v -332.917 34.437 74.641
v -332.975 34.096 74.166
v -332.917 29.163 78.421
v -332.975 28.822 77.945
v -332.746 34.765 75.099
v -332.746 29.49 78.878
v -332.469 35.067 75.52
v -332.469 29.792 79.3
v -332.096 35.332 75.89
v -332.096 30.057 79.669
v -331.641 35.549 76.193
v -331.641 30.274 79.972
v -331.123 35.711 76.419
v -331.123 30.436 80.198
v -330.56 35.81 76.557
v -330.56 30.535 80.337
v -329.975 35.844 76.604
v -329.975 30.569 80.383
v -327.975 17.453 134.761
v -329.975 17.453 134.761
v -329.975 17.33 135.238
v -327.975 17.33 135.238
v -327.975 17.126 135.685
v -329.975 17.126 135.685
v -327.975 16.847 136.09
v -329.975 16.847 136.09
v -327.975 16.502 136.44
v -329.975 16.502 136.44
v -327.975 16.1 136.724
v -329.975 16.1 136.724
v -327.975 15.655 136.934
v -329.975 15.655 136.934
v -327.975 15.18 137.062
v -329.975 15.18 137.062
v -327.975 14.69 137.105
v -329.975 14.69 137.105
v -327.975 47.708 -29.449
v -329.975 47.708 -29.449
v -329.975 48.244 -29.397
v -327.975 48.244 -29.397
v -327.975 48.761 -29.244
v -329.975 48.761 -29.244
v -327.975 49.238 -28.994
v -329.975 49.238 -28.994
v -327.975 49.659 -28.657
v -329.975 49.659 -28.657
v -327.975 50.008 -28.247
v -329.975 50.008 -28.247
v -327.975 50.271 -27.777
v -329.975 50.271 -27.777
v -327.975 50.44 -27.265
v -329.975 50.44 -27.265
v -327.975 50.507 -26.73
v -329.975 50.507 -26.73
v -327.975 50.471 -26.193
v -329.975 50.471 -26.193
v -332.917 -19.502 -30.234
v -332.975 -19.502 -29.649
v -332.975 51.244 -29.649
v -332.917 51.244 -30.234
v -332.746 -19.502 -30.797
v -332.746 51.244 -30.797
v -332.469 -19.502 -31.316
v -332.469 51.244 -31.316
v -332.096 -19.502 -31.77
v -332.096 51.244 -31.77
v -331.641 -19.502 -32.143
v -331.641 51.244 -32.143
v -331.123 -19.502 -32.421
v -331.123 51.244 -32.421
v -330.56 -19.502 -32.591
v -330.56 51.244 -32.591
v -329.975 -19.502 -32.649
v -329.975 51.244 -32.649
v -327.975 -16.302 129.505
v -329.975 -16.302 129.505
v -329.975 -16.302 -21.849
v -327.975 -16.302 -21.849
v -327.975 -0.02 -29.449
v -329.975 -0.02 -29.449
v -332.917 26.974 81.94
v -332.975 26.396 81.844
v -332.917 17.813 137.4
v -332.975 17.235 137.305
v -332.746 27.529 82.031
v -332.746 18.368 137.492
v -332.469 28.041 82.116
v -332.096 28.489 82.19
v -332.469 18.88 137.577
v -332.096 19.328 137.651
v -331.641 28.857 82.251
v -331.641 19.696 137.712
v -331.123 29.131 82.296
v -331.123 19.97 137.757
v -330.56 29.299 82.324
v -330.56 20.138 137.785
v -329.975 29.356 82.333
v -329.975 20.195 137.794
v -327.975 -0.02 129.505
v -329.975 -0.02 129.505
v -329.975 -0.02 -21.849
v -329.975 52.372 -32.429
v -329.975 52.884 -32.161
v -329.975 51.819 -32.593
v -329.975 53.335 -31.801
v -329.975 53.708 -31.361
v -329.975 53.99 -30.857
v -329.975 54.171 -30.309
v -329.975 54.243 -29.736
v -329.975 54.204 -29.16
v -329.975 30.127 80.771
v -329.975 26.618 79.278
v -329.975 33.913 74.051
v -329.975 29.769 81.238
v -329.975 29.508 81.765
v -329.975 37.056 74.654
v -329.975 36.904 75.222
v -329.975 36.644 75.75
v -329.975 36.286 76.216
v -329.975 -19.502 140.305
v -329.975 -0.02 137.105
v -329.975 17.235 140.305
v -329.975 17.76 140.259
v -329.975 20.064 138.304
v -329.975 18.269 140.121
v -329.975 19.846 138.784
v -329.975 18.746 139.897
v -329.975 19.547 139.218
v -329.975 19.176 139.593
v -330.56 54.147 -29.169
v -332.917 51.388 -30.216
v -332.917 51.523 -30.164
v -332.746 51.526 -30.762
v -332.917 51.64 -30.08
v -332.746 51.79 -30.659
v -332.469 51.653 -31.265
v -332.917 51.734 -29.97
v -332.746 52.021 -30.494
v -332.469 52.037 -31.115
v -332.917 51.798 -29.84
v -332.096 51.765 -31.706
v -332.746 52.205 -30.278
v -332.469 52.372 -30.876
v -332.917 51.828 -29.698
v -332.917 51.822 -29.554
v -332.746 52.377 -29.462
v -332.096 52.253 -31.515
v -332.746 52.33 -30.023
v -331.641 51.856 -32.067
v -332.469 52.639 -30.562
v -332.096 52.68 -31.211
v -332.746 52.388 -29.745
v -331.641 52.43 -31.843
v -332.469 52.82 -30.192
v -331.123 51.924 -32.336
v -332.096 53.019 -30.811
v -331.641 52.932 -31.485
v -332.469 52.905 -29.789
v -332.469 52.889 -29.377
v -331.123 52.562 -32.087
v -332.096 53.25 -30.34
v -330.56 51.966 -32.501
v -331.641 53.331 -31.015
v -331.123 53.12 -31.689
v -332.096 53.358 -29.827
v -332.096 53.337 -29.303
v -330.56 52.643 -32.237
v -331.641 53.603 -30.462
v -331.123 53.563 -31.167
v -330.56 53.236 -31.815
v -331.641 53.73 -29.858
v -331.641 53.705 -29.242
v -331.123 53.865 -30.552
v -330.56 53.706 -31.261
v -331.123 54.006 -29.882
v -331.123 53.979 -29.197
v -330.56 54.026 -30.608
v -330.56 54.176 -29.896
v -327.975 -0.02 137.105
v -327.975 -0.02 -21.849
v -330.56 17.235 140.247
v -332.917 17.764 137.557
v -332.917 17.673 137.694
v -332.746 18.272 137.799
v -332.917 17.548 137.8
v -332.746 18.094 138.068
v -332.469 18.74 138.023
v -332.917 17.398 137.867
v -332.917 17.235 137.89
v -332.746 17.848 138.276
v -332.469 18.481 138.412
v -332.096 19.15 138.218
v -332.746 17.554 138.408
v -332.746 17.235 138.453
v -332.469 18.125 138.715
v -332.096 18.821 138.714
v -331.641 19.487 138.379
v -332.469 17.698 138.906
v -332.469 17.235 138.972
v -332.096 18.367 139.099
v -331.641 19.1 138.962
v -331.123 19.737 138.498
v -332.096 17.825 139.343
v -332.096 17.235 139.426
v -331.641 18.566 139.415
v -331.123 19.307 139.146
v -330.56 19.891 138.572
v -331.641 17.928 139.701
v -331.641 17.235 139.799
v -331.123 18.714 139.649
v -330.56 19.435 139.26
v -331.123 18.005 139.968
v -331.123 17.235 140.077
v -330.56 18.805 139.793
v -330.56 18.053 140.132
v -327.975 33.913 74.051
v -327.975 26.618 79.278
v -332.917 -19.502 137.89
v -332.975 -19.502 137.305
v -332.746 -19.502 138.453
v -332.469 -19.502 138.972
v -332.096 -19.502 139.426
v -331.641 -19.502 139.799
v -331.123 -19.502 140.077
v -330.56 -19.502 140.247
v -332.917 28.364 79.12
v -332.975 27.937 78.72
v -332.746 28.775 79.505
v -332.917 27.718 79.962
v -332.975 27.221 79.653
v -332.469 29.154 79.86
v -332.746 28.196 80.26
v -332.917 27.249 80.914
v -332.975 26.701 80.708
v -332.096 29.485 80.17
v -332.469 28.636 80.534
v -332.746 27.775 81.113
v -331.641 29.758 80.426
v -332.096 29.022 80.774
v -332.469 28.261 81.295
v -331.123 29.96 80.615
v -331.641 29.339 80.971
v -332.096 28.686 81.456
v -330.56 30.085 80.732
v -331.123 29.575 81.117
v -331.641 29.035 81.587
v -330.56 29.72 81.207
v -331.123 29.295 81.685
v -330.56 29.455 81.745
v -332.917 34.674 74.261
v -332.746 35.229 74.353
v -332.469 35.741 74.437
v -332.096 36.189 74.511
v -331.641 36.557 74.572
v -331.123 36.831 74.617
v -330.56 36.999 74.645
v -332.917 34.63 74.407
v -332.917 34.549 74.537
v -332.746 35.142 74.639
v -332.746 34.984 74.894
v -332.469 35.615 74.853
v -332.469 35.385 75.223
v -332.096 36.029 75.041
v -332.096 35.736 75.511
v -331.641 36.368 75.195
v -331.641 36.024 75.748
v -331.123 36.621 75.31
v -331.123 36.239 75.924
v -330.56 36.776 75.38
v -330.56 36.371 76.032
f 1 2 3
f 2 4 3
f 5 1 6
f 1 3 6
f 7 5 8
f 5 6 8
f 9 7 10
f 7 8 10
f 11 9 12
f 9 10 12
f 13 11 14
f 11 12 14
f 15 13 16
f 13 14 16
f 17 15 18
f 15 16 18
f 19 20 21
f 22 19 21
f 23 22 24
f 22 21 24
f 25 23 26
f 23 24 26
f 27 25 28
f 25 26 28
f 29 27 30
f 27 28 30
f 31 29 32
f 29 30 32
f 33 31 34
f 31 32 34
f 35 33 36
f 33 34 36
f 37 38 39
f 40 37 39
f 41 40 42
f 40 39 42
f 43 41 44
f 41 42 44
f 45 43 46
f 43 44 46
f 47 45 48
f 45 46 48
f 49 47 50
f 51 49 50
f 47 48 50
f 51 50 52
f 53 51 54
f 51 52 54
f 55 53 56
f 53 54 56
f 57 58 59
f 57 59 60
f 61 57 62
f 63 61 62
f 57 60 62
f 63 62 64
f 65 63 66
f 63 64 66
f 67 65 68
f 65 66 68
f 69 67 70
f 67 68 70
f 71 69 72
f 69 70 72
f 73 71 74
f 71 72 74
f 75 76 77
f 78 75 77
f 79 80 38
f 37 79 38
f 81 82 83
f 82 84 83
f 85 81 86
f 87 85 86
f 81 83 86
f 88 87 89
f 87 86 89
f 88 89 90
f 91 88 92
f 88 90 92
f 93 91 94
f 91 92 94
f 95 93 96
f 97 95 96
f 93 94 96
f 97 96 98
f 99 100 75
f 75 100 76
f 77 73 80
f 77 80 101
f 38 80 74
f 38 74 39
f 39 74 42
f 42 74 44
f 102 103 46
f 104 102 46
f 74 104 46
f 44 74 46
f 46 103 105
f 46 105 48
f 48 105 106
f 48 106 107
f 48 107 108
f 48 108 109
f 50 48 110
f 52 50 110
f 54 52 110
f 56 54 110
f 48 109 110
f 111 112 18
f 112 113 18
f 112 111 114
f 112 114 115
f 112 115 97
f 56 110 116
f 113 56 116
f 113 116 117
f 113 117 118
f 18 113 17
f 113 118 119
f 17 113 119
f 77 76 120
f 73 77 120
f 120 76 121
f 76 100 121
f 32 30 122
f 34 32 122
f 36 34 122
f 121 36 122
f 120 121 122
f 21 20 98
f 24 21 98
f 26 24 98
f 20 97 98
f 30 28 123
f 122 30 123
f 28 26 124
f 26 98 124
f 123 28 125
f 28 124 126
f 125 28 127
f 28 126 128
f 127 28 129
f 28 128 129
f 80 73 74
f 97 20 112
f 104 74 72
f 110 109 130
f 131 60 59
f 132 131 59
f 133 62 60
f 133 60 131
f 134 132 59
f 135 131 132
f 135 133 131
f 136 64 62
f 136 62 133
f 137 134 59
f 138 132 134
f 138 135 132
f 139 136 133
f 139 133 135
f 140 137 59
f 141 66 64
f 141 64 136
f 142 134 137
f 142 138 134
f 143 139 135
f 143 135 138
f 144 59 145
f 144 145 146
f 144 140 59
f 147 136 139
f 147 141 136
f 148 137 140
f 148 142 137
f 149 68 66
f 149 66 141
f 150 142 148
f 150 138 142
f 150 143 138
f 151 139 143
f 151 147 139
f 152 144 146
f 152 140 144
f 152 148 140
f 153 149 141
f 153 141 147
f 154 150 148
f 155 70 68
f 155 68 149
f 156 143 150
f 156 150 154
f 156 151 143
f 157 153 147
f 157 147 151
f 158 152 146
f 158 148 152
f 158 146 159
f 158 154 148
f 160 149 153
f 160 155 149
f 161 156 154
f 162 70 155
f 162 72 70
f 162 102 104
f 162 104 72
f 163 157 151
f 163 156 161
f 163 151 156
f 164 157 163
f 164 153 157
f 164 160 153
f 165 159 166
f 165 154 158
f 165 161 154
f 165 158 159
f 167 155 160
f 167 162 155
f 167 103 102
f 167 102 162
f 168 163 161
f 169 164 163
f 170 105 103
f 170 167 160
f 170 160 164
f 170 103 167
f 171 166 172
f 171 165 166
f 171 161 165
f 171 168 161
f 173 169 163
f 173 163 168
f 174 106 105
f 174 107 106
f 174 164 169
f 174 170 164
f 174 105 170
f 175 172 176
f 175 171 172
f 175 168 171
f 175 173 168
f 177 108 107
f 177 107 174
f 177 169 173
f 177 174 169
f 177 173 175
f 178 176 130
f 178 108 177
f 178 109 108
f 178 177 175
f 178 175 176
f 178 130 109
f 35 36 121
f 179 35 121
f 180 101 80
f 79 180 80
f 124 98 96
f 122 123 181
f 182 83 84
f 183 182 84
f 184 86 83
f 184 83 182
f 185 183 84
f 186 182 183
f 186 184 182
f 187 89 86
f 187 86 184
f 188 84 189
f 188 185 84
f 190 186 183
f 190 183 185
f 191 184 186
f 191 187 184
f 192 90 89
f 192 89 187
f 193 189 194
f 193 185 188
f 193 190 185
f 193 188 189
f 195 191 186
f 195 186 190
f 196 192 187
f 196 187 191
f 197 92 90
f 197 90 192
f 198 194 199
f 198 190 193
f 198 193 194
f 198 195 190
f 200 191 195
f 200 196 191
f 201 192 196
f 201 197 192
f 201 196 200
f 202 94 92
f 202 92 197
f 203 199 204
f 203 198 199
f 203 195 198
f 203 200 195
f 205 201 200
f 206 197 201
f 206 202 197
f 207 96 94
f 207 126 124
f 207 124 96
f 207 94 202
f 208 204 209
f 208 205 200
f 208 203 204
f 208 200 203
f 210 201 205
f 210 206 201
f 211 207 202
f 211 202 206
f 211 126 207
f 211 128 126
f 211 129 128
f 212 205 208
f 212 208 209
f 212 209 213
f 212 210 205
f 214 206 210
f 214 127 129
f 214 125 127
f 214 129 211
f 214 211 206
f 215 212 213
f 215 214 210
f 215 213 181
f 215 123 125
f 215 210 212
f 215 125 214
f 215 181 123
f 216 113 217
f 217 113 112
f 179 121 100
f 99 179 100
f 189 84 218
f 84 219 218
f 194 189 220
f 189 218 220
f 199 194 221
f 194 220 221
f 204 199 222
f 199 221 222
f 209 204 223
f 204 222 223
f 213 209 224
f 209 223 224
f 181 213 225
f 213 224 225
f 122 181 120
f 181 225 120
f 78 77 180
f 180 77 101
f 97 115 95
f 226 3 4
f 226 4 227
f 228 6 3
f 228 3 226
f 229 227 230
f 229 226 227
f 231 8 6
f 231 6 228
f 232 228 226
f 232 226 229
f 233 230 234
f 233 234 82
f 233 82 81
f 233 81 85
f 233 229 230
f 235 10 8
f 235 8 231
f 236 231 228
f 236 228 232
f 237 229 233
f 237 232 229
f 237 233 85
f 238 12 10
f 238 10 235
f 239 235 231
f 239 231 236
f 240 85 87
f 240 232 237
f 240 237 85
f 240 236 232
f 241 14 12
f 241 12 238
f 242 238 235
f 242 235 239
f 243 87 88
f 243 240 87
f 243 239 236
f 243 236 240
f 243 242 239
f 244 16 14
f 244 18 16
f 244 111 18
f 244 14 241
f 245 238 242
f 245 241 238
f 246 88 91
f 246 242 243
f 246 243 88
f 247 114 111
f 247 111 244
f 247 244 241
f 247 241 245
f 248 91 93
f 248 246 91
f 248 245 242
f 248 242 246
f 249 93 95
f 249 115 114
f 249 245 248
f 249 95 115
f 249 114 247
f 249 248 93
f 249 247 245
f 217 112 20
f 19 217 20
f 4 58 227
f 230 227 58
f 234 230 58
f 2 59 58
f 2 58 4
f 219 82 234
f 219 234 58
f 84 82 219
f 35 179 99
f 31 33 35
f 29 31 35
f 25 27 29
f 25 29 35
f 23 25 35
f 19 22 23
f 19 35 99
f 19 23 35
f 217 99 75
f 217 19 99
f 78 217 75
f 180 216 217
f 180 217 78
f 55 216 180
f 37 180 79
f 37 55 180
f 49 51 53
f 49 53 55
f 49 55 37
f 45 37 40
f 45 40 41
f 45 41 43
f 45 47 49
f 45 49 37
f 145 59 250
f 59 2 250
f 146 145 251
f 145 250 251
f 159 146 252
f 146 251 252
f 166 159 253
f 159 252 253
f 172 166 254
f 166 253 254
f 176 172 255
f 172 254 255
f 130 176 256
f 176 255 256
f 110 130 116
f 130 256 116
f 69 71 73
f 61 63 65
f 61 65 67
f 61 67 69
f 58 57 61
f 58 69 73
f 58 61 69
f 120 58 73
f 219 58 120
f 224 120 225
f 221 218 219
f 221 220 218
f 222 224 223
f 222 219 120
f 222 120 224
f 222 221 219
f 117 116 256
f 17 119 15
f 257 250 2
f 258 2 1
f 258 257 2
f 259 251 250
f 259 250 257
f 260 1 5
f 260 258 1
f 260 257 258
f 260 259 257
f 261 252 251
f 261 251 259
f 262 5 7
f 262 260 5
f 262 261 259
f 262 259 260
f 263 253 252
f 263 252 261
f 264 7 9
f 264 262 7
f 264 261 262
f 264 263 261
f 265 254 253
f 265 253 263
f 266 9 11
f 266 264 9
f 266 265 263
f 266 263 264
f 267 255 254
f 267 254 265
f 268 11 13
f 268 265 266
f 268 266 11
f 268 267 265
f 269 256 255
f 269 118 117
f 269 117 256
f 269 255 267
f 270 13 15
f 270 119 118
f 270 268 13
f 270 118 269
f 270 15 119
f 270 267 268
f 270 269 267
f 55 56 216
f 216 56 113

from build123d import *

# Parameters (mm, degrees)
BOSS_EXTRUDE1_DEPTH = 2
BOSS_EXTRUDE2_START = 3
BOSS_EXTRUDE2_DEPTH = 3
FILLET1_R           = 3


with BuildPart() as part:
    # Sketch1 → Boss-Extrude1 (new body)
    with BuildSketch(Plane.ZY.offset(329.974562358)):
        with BuildLine():
            Line((137.105001839, 14.690261729), (137.105001839, -0.019509128))
            Line((137.105001839, -0.019509128), (133.705001839, -0.019509128))
            Line((133.705001839, -0.019509128), (129.505001839, -0.019509128))
            Line((129.505001839, -0.019509128), (129.505001839, -16.302112125))
            Line((129.505001839, -16.302112125), (-21.848970599, -16.302112125))
            Line((-21.848970599, -16.302112125), (-21.848970599, -0.019509128))
            Line((-21.848970599, -0.019509128), (-26.048970599, -0.019509128))
            Line((-26.048970599, -0.019509128), (-29.448970599, -0.019509128))
            Line((-29.448970599, -0.019509128), (-29.448970599, 47.708117707))
            ThreePointArc((-29.448970599, 47.708117707), (-28.460366767, 49.843262649), (-26.192653512, 50.470684397))
            Line((-26.192653512, 50.470684397), (74.05116687, 33.912543624))
            Line((74.05116687, 33.912543624), (79.277875997, 26.617509644))
            Line((79.277875997, 26.617509644), (134.761318926, 17.452828418))
            ThreePointArc((134.761318926, 17.452828418), (136.440146781, 16.501657897), (137.105001839, 14.690261729))
        make_face()
    extrude(amount=-BOSS_EXTRUDE1_DEPTH)

    # Sketch1<4> → Boss-Extrude2 (add)
    # profile 1 of 3: a face of its own
    with BuildSketch(Plane.ZY.offset(329.974562358).offset(BOSS_EXTRUDE2_START)):
        with BuildLine():
            Line((-32.648970599, -19.502112125), (140.305001839, -19.502112125))
            Line((140.305001839, -19.502112125), (140.305001839, -10.219509128))
            Line((140.305001839, -10.219509128), (133.705001839, -10.219509128))
            Line((133.705001839, -10.219509128), (133.705001839, -0.219509128))
            Line((133.705001839, -0.219509128), (137.305001839, -0.219509128))
            Line((137.305001839, -0.219509128), (137.305001839, 14.690261729))
            ThreePointArc((137.305001839, 14.690261729), (136.592657134, 16.631043337), (134.793913004, 17.650154611))
            Line((134.793913004, 17.650154611), (79.39220526, 26.801334927))
            Line((79.39220526, 26.801334927), (74.165496133, 34.096368907))
            Line((74.165496133, 34.096368907), (-26.160059434, 50.668010589))
            ThreePointArc((-26.160059434, 50.668010589), (-28.589752208, 49.995773002), (-29.648970599, 47.708117707))
            Line((-29.648970599, 47.708117707), (-29.648970599, -0.219509128))
            Line((-29.648970599, -0.219509128), (-26.048970599, -0.219509128))
            Line((-26.048970599, -0.219509128), (-26.048970599, -10.219509128))
            Line((-26.048970599, -10.219509128), (-32.648970599, -10.219509128))
            Line((-32.648970599, -10.219509128), (-32.648970599, -19.502112125))
        make_face()
        with BuildLine():
            ThreePointArc((137.105001839, 14.690261729), (136.440146781, 16.501657897), (134.761318926, 17.452828418))
            Line((134.761318926, 17.452828418), (79.277875997, 26.617509644))
            Line((79.277875997, 26.617509644), (74.05116687, 33.912543624))
            Line((74.05116687, 33.912543624), (-26.192653512, 50.470684397))
            ThreePointArc((-26.192653512, 50.470684397), (-28.460366767, 49.843262649), (-29.448970599, 47.708117707))
            Line((-29.448970599, 47.708117707), (-29.448970599, -0.019509128))
            Line((-29.448970599, -0.019509128), (-26.048970599, -0.019509128))
            Line((-26.048970599, -0.019509128), (-21.848970599, -0.019509128))
            Line((-21.848970599, -0.019509128), (-21.848970599, -16.302112125))
            Line((-21.848970599, -16.302112125), (129.505001839, -16.302112125))
            Line((129.505001839, -16.302112125), (129.505001839, -0.019509128))
            Line((129.505001839, -0.019509128), (133.705001839, -0.019509128))
            Line((133.705001839, -0.019509128), (137.105001839, -0.019509128))
            Line((137.105001839, -0.019509128), (137.105001839, 14.690261729))
        make_face(mode=Mode.SUBTRACT)
    # profile 2 of 3: a face of its own
    with BuildSketch(Plane.ZY.offset(329.974562358).offset(BOSS_EXTRUDE2_START)):
        with BuildLine():
            ThreePointArc((76.604168861, 35.843616835), (75.749893119, 36.643855156), (74.654407298, 37.056261789))
            Line((74.654407298, 37.056261789), (-29.160059434, 54.204197172))
            ThreePointArc((-29.160059434, 54.204197172), (-31.589752208, 53.531959584), (-32.648970599, 51.24430429))
            Line((-32.648970599, 51.24430429), (-32.648970599, -10.219509128))
            Line((-32.648970599, -10.219509128), (-26.048970599, -10.219509128))
            Line((-26.048970599, -10.219509128), (-26.048970599, -0.219509128))
            Line((-26.048970599, -0.219509128), (-29.648970599, -0.219509128))
            Line((-29.648970599, -0.219509128), (-29.648970599, 47.708117707))
            ThreePointArc((-29.648970599, 47.708117707), (-28.589752208, 49.995773002), (-26.160059434, 50.668010589))
            Line((-26.160059434, 50.668010589), (74.165496133, 34.096368907))
            Line((74.165496133, 34.096368907), (79.39220526, 26.801334927))
            Line((79.39220526, 26.801334927), (134.793913004, 17.650154611))
            ThreePointArc((134.793913004, 17.650154611), (136.592657134, 16.631043337), (137.305001839, 14.690261729))
            Line((137.305001839, 14.690261729), (137.305001839, -0.219509128))
            Line((137.305001839, -0.219509128), (133.705001839, -0.219509128))
            Line((133.705001839, -0.219509128), (133.705001839, -10.219509128))
            Line((133.705001839, -10.219509128), (140.305001839, -10.219509128))
            Line((140.305001839, -10.219509128), (140.305001839, 17.2353763))
            ThreePointArc((140.305001839, 17.2353763), (139.592657134, 19.176157909), (137.793913004, 20.195269182))
            Line((137.793913004, 20.195269182), (82.333171975, 29.356200538))
            ThreePointArc((82.333171975, 29.356200538), (81.237686153, 29.768607171), (80.383410411, 30.568845492))
            Line((80.383410411, 30.568845492), (76.604168861, 35.843616835))
        make_face()
    # profile 3 of 3: a face of its own
    with BuildSketch(Plane.ZY.offset(329.974562358).offset(BOSS_EXTRUDE2_START)):
        with BuildLine():
            Line((137.105001839, 14.690261729), (137.105001839, -0.019509128))
            Line((137.105001839, -0.019509128), (133.705001839, -0.019509128))
            Line((133.705001839, -0.019509128), (129.505001839, -0.019509128))
            Line((129.505001839, -0.019509128), (129.505001839, -16.302112125))
            Line((129.505001839, -16.302112125), (-21.848970599, -16.302112125))
            Line((-21.848970599, -16.302112125), (-21.848970599, -0.019509128))
            Line((-21.848970599, -0.019509128), (-26.048970599, -0.019509128))
            Line((-26.048970599, -0.019509128), (-29.448970599, -0.019509128))
            Line((-29.448970599, -0.019509128), (-29.448970599, 47.708117707))
            ThreePointArc((-29.448970599, 47.708117707), (-28.460366767, 49.843262649), (-26.192653512, 50.470684397))
            Line((-26.192653512, 50.470684397), (74.05116687, 33.912543624))
            Line((74.05116687, 33.912543624), (79.277875997, 26.617509644))
            Line((79.277875997, 26.617509644), (134.761318926, 17.452828418))
            ThreePointArc((134.761318926, 17.452828418), (136.440146781, 16.501657897), (137.105001839, 14.690261729))
        make_face()
    extrude(amount=-BOSS_EXTRUDE2_DEPTH)

    # Fillet1
    fillet1_edges = [part.edges().sort_by_distance(p)[0] for p in [
        (-332.974562358, 15.871096082, -32.648970599),
        (-332.974562358, 53.531959584, -31.589752208),
        (-332.974562358, 45.63022948, 22.747173932),
        (-332.974562358, 36.643855156, 75.749893119),
        (-332.974562358, 33.206231163, 78.493789636),
        (-332.974562358, 29.768607171, 81.237686153),
        (-332.974562358, 24.77573486, 110.063542489),
        (-332.974562358, 19.176157909, 139.592657134),
        (-332.974562358, -1.133367912, 140.305001839),
    ]]
    fillet(fillet1_edges, radius=FILLET1_R - 0.0001)  # a hair under: the kernel refuses the full size


with BuildPart() as body_2:
    # Mirror1: mirrored copy
    add(part.part.mirror(Plane.ZY.offset(327.974562358)))


solid = part.part
